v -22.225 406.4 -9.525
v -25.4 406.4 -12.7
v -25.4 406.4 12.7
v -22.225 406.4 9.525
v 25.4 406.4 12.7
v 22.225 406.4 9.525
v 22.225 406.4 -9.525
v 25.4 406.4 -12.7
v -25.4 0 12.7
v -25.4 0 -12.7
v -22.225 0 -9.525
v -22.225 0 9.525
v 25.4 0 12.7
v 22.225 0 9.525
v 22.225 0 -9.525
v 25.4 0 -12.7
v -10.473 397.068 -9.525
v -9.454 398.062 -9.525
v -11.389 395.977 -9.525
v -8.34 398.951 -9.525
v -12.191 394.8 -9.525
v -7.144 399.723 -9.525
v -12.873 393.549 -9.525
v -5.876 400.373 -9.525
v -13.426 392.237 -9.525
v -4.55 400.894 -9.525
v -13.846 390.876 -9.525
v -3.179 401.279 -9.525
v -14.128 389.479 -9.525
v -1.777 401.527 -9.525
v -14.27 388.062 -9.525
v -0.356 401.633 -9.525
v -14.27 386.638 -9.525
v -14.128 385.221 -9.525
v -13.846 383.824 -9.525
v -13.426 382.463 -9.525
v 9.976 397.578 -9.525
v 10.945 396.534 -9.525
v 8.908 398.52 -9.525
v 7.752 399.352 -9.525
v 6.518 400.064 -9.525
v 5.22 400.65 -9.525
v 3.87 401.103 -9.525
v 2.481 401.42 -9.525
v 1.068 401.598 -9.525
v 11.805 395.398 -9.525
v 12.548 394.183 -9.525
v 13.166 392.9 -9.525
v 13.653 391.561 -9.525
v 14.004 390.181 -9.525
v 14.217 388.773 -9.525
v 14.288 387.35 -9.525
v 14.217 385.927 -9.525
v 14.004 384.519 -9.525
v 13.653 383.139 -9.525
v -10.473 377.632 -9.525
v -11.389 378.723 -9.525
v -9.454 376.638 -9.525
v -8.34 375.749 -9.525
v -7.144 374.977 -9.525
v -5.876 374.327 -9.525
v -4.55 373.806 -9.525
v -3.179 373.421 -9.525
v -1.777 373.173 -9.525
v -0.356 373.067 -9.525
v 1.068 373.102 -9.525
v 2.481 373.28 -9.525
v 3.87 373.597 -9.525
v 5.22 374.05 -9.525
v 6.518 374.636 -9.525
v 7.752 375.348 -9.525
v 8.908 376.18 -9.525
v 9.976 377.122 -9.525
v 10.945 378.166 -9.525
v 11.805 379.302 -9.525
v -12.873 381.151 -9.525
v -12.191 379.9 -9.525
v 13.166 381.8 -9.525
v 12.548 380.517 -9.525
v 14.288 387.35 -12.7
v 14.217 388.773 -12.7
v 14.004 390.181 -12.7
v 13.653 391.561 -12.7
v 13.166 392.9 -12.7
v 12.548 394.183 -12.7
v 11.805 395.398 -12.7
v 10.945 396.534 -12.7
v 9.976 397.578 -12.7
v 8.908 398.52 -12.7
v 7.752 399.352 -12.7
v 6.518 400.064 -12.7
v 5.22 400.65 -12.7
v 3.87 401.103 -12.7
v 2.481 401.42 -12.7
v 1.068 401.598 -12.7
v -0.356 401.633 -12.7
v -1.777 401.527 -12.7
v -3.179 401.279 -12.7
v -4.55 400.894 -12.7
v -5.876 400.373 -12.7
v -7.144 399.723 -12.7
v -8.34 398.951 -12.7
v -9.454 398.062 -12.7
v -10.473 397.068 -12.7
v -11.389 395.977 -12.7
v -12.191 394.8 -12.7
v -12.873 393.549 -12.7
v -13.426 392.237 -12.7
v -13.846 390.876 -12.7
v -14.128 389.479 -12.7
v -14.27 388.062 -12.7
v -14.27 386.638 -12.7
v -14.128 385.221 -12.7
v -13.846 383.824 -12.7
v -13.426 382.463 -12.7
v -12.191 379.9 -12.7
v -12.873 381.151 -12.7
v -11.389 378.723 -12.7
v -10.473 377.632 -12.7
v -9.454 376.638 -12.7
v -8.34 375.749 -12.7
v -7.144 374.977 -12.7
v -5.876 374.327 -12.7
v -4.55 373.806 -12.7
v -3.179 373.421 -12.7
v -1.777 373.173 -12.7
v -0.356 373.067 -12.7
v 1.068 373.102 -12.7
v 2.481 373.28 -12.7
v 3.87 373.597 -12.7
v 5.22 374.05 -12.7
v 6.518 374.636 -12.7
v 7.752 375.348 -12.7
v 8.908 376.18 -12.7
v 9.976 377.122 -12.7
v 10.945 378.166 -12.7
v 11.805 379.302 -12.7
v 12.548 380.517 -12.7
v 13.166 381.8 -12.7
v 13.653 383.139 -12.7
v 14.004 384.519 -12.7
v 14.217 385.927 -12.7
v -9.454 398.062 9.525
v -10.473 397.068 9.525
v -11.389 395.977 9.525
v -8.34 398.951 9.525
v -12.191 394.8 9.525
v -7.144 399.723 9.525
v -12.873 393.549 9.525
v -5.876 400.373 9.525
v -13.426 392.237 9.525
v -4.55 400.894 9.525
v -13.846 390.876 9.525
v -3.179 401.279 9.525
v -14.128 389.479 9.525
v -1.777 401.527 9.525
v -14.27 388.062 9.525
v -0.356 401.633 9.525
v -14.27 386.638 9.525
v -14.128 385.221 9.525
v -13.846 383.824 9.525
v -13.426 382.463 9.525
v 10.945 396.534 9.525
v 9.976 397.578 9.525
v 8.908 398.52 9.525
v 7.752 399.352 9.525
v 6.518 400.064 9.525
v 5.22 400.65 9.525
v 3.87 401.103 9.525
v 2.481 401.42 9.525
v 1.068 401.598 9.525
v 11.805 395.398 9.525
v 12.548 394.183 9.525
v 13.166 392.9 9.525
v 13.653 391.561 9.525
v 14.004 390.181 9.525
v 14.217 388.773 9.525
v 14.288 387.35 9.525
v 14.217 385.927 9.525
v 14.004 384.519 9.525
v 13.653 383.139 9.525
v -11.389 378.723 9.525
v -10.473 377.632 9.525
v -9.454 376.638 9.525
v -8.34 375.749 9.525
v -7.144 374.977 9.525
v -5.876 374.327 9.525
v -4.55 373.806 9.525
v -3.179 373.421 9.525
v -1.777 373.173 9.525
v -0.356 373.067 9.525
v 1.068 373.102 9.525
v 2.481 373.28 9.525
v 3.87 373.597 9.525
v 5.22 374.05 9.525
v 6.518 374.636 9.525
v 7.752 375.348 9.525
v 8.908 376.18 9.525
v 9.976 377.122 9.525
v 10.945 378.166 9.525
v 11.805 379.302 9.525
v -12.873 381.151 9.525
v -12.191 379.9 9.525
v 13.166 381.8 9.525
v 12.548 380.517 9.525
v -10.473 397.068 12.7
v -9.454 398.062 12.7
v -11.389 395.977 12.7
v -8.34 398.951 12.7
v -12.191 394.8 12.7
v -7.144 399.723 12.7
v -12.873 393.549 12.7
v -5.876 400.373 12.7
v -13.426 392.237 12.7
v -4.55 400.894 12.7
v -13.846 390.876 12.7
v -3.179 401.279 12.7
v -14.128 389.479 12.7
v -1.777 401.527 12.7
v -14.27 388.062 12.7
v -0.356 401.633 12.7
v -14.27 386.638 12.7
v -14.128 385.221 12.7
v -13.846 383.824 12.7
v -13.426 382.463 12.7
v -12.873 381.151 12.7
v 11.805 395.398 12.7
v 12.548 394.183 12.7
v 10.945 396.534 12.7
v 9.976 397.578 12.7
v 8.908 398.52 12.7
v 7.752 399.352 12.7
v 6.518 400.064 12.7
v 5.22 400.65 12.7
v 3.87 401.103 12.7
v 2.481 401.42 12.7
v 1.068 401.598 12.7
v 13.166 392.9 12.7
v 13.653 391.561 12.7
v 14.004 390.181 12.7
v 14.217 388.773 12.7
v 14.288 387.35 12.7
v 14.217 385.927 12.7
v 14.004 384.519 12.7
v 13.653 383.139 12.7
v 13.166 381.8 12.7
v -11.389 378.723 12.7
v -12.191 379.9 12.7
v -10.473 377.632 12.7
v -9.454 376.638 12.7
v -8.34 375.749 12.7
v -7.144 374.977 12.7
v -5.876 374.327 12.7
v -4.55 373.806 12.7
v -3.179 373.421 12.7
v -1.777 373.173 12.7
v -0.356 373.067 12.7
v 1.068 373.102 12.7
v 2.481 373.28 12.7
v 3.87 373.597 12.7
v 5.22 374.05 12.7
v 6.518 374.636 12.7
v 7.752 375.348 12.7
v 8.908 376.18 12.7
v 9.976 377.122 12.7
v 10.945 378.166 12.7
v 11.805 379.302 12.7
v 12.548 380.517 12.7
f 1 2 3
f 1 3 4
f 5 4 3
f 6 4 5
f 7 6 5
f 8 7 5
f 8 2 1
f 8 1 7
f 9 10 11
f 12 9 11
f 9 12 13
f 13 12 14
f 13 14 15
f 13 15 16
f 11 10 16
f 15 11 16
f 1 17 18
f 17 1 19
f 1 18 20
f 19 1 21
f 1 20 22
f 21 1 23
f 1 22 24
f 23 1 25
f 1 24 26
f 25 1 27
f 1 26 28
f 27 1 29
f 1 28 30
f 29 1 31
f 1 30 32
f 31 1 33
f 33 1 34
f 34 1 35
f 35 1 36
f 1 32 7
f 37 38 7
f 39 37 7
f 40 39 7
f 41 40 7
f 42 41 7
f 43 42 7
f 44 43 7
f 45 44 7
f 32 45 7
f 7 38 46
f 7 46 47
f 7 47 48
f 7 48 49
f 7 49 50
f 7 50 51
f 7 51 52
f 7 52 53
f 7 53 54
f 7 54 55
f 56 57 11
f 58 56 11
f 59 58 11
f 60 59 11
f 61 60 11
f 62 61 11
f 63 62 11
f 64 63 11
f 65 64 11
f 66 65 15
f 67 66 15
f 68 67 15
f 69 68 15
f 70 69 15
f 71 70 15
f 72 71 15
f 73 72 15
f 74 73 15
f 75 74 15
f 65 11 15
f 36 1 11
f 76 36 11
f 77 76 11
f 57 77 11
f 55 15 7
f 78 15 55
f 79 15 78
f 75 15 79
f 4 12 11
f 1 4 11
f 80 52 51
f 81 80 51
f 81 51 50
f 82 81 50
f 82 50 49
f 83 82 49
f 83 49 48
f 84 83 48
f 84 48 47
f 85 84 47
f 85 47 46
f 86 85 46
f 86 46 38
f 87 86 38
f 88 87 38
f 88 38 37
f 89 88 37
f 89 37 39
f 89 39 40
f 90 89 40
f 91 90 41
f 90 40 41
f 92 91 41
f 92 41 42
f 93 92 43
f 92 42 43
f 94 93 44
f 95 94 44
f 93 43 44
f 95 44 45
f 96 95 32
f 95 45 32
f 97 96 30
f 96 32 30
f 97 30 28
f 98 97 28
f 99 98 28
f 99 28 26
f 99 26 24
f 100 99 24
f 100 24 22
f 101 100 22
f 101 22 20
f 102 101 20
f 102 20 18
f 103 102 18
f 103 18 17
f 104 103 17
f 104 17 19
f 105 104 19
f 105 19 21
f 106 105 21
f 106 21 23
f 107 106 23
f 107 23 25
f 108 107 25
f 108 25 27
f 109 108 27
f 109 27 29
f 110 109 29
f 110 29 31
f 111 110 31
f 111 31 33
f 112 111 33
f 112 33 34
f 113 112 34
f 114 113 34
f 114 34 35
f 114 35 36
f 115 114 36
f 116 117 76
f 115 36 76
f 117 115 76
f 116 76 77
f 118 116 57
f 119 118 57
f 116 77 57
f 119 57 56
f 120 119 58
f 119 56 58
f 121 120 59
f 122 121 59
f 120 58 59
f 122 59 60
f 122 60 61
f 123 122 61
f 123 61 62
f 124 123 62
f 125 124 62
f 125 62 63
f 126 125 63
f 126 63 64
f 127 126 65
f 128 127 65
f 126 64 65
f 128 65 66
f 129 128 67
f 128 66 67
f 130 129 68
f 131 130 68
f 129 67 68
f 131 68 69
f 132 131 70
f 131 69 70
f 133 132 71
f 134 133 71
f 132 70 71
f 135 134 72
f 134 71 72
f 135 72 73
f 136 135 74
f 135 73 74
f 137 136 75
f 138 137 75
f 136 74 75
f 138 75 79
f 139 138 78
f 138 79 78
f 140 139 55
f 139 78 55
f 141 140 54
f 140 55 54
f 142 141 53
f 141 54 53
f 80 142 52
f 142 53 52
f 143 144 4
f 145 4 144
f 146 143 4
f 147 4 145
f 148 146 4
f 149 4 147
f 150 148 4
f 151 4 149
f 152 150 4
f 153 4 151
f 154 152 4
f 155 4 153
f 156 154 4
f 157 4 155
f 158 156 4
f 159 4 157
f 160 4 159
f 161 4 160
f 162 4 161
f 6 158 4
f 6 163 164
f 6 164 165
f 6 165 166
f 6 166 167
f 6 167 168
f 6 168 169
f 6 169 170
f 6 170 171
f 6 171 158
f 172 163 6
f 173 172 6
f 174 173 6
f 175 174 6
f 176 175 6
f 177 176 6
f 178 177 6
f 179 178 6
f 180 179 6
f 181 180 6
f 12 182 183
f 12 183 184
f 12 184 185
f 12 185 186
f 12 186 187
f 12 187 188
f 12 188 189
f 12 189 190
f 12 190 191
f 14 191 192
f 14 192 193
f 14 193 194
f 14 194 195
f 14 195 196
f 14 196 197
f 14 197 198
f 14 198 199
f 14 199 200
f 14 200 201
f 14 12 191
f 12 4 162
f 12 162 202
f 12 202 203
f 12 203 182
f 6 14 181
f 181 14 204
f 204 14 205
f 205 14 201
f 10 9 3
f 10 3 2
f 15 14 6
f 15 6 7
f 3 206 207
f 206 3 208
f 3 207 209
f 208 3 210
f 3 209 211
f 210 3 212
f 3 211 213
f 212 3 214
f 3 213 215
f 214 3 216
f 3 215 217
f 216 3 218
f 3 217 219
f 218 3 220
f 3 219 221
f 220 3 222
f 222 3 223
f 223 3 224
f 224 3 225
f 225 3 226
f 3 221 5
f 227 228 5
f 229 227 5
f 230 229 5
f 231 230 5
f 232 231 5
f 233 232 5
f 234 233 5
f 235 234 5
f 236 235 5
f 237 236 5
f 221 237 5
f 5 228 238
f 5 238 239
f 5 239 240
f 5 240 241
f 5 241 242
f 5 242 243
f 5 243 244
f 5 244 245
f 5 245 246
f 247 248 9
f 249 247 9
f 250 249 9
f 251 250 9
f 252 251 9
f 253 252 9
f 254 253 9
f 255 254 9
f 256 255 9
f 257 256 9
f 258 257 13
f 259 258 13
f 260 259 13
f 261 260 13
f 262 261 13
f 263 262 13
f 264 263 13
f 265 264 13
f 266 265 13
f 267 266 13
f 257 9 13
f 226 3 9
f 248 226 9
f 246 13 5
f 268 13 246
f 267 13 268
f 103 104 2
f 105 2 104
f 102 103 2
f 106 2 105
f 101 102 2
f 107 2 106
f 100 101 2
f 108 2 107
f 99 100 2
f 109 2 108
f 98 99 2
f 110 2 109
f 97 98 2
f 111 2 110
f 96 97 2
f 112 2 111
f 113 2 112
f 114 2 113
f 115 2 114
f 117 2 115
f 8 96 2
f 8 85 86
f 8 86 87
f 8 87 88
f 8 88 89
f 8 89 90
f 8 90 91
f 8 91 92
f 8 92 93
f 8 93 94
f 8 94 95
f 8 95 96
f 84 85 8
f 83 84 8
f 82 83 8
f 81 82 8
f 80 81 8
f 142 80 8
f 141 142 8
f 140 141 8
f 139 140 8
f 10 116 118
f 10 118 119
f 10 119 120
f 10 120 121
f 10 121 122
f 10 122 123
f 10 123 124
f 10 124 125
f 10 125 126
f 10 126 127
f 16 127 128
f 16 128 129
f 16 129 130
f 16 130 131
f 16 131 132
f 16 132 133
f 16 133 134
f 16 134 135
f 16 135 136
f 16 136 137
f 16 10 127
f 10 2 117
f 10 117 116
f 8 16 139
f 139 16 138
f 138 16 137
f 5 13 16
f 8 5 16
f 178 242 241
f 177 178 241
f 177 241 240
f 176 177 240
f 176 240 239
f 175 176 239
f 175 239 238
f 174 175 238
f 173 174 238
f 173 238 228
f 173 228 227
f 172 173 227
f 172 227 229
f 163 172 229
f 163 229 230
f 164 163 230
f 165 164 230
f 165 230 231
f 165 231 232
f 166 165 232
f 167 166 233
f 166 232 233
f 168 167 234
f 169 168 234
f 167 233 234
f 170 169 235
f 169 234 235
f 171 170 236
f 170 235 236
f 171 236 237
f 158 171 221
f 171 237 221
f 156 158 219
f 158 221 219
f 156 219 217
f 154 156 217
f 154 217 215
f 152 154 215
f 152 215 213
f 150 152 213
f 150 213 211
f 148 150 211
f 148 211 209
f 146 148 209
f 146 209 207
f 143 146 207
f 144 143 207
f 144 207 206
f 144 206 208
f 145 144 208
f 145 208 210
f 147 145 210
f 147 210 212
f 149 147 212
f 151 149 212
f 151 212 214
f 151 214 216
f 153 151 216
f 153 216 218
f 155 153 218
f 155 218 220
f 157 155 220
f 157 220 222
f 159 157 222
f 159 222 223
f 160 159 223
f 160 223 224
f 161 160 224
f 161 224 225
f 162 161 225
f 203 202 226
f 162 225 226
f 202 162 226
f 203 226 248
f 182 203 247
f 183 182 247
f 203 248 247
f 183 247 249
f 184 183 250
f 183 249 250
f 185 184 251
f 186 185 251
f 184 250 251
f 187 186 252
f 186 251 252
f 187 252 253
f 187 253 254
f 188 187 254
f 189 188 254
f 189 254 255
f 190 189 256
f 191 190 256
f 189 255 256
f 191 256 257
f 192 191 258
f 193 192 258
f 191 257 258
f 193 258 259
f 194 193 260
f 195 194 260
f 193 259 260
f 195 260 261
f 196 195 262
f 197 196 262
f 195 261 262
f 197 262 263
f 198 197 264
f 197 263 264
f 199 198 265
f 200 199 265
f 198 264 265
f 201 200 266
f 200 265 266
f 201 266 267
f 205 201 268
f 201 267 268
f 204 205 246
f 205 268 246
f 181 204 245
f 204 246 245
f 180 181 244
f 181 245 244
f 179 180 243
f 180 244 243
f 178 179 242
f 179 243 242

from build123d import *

# Parameters (mm, degrees)
SKETCH1_W           = 50.8
SKETCH1_H           = 25.4
BOSS_EXTRUDE1_DEPTH = 406.4
SHELL1_T            = -3.175
SKETCH2_R           = 14.2875
CUT_EXTRUDE1_DEPTH  = 406.4


with BuildPart() as part:
    # Sketch1 → Boss-Extrude1 (new body)
    with BuildSketch(Plane(origin=(0, 0, 0), x_dir=(1, 0, 0), z_dir=(0, 1, 0))):
        Rectangle(SKETCH1_W, SKETCH1_H)
    extrude(amount=BOSS_EXTRUDE1_DEPTH)

    # Shell1
    shell1_openings = [part.faces().sort_by_distance(p)[0] for p in [
        (0, 406.4, 0),
        (0, 0, 0),
    ]]
    offset(amount=SHELL1_T, openings=shell1_openings, kind=Kind.INTERSECTION)

    # Sketch2 → Cut-Extrude1 (cut)
    with BuildSketch(Plane.XY.offset(12.7)):
        with Locations((0, 387.35)):
            Circle(SKETCH2_R)
    extrude(amount=-CUT_EXTRUDE1_DEPTH, mode=Mode.SUBTRACT)


solid = part.part
